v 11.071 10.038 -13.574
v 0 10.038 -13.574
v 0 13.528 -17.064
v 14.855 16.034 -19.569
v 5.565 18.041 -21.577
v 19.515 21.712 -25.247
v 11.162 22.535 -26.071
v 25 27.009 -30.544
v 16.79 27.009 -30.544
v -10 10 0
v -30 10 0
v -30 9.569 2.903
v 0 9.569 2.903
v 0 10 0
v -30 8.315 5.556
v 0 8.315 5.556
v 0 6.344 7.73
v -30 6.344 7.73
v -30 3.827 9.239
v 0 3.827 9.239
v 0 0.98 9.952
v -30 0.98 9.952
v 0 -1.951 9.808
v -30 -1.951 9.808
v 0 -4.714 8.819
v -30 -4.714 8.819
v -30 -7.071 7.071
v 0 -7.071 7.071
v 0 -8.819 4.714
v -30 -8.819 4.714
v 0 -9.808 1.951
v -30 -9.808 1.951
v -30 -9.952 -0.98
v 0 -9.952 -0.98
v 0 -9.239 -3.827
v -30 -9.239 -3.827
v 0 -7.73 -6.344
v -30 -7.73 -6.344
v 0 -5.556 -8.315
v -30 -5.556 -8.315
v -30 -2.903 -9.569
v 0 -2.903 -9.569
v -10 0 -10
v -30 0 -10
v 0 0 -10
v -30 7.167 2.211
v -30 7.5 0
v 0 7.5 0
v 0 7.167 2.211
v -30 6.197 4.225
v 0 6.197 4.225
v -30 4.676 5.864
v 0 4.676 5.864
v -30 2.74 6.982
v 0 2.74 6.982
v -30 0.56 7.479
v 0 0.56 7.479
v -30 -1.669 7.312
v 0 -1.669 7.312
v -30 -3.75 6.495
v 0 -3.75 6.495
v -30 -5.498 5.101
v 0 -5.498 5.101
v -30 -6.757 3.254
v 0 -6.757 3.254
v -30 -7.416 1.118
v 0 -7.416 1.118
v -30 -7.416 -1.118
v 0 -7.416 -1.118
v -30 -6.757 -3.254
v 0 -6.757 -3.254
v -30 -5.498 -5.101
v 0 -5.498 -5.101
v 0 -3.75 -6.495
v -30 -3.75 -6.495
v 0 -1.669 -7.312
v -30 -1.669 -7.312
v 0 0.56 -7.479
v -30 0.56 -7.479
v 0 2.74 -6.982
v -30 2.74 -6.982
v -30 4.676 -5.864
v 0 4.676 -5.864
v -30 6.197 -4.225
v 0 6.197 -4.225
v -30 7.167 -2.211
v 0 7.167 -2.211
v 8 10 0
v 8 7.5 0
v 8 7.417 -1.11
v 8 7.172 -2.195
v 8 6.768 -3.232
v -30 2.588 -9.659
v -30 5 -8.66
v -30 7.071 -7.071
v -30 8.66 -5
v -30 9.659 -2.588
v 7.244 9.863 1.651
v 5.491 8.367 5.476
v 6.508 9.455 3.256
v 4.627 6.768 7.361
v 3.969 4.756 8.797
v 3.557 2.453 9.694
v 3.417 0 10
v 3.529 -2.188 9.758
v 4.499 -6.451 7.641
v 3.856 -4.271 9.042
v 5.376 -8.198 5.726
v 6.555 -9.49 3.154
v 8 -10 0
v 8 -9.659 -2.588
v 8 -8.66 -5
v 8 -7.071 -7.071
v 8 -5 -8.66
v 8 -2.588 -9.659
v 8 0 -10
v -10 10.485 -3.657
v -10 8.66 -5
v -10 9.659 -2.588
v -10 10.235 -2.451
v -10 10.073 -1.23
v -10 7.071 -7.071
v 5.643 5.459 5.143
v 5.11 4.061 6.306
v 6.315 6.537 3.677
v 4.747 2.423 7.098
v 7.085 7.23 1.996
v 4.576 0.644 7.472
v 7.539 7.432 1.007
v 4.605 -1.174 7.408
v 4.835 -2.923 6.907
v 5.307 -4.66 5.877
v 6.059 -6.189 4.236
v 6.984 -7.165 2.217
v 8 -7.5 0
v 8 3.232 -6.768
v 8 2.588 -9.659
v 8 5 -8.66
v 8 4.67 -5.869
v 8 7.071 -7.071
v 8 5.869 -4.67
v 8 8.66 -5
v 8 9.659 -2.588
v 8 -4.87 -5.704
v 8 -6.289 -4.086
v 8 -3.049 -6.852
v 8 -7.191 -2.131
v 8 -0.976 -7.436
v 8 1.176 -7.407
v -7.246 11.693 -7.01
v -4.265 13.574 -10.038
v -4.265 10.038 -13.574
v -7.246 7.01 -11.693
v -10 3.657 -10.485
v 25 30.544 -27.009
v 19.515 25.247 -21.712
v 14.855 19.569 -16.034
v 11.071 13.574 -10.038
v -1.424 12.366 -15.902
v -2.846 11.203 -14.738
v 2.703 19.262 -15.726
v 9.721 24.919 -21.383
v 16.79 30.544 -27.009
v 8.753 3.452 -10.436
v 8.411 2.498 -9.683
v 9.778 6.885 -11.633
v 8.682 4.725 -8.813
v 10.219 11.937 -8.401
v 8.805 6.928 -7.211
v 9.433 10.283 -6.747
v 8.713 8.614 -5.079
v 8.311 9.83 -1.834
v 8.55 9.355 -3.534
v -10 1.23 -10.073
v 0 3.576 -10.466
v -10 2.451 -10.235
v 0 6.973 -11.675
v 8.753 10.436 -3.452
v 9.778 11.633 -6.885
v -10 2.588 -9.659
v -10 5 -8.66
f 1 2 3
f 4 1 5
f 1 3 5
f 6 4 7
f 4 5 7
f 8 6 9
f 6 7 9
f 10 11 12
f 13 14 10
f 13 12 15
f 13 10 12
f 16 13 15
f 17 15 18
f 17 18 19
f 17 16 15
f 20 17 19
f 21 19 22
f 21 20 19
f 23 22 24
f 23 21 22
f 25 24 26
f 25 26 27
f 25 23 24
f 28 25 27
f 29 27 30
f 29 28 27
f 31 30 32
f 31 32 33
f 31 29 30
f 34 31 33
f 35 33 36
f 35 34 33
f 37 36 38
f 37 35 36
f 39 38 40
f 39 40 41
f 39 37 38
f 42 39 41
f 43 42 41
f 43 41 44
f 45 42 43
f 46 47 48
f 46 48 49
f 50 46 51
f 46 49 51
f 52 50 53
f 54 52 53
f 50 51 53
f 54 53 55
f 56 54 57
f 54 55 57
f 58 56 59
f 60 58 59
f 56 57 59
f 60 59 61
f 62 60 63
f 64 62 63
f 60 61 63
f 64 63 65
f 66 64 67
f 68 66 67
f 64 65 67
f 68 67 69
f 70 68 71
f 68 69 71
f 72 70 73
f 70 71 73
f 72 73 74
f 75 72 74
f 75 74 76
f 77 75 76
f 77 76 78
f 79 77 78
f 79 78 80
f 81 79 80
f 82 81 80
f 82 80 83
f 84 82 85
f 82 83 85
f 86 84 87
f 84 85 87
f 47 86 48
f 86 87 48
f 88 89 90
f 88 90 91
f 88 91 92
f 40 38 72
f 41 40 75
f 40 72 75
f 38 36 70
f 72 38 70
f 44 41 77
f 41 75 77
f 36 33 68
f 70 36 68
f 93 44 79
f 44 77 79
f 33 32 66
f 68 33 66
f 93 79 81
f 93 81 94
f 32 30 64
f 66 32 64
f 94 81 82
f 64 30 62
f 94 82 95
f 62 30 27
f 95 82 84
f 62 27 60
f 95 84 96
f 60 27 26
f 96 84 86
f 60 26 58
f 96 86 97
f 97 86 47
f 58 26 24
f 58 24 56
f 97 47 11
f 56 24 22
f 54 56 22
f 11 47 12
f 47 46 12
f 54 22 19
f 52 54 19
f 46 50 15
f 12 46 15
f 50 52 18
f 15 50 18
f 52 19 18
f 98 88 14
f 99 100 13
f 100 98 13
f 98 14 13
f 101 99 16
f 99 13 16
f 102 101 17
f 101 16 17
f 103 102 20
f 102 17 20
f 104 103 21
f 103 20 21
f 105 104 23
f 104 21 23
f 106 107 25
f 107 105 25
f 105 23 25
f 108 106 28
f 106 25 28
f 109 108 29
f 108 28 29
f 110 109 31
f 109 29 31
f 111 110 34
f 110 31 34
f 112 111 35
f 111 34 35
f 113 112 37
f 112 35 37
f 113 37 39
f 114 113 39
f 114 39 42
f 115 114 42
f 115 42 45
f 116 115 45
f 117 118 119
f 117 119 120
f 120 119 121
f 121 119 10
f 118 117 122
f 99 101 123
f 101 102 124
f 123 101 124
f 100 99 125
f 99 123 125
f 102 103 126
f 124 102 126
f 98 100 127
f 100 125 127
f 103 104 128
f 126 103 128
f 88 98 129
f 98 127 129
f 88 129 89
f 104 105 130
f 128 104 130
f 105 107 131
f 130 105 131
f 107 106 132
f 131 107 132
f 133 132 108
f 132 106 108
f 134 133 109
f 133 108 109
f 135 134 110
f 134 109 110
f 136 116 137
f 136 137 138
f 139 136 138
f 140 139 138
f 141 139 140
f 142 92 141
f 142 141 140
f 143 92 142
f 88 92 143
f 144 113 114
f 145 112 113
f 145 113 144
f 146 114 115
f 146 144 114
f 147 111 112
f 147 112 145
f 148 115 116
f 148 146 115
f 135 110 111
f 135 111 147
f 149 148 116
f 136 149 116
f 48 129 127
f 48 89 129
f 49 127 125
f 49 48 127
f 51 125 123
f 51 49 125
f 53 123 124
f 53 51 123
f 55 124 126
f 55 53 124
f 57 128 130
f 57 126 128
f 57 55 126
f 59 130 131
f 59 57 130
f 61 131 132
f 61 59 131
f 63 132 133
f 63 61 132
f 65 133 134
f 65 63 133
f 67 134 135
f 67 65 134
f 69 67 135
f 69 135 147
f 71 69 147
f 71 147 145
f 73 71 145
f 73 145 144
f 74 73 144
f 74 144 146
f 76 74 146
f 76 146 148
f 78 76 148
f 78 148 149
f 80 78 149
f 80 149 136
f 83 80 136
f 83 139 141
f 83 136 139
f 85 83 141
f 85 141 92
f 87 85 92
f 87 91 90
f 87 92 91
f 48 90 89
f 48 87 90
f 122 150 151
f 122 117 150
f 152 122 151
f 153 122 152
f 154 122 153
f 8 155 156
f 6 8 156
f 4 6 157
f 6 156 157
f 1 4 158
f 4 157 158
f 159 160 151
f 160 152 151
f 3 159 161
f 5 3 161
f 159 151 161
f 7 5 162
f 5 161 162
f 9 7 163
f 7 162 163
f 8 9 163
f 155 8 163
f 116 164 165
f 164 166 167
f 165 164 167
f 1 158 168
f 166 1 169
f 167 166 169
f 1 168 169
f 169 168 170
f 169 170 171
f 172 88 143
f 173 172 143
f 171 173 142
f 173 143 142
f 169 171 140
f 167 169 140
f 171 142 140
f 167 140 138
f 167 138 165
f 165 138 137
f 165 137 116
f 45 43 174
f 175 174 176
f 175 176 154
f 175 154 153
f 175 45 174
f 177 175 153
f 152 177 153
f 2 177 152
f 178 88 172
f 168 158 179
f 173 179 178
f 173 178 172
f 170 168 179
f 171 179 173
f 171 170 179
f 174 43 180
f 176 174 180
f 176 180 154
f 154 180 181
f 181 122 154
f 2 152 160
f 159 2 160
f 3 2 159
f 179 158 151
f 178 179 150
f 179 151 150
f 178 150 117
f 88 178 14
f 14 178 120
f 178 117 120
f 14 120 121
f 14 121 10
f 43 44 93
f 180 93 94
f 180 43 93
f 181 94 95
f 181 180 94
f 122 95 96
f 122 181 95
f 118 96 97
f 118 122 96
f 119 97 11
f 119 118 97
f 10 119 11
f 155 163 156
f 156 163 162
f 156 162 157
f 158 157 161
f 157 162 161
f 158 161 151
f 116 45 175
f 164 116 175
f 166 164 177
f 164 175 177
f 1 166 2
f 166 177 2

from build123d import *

# Parameters (mm, degrees)
F0_R          = 7.5
F1_DEPTH      = 8
F2_DEPTH      = 5
F2_DEPTH_BACK = 30
F4_DEPTH      = 12.5
F5_DEPTH      = 10
F5_DEPTH_BACK = 25
F7_DEPTH      = 25
F7_DEPTH_BACK = 25


with BuildPart() as f1:
    # F0 (on Right) → F1 (new body)
    with BuildSketch(Plane.YZ):
        with BuildLine():
            ThreePointArc((0, -10), (7.0710678119, -7.0710678119), (10, 0))
            ThreePointArc((10, 0), (-7.0710678119, 7.0710678119), (0, -10))
        make_face()
        Circle(F0_R, mode=Mode.SUBTRACT)
    extrude(amount=F1_DEPTH)

    # F0 (on Right) → F2 (join, two sides)
    with BuildSketch(Plane.YZ) as f2_sk:
        with BuildLine():
            ThreePointArc((0, -10), (7.0710678119, -7.0710678119), (10, 0))
            ThreePointArc((10, 0), (-7.0710678119, 7.0710678119), (0, -10))
        make_face()
        Circle(F0_R, mode=Mode.SUBTRACT)
    extrude(amount=F2_DEPTH)
    extrude(f2_sk.sketch, amount=-F2_DEPTH_BACK)

    # F3 (on Front) → F4 (cut, symmetric)
    with BuildSketch(Plane.XZ):
        Polygon((8, 0), (8, 10), (3.417424305, 10), align=None)
    extrude(amount=F4_DEPTH, both=True, mode=Mode.SUBTRACT)

    # F0 (on Right) → F5 (join, two sides)
    with BuildSketch(Plane.YZ) as f5_sk:
        with BuildLine():
            ThreePointArc((13.5738675599, -10.038333654), (10.9801111189, -5.3064134392), (10, 0))
            ThreePointArc((10, 0), (7.0710678119, -7.0710678119), (0, -10))
            ThreePointArc((0, -10), (5.3064134392, -10.9801111189), (10.038333654, -13.5738675599))
            Line((10.038333654, -13.5738675599), (27.0088964024, -30.5444303084))
            Line((27.0088964024, -30.5444303084), (30.5444303084, -27.0088964024))
            Line((30.5444303084, -27.0088964024), (13.5738675599, -10.038333654))
        make_face()
    extrude(amount=-F5_DEPTH)
    extrude(f5_sk.sketch, amount=F5_DEPTH_BACK)

    # F6 (on face) → F7 (cut, two sides)
    with BuildSketch(Plane(origin=(0, 1.767766953, 1.767766953), x_dir=(1, 0, 0), z_dir=(0, 0.7071067812, 0.7071067812))) as f7_sk:
        with BuildLine():
            ThreePointArc((-10, 10), (-7.1369616608, 13.3518740219), (-4.2652819266, 16.6963475971))
            Line((-4.2652819266, 16.696347597), (-10, 16.696347597))
            Line((-10, 16.696347597), (-10, 10))
        make_face()
        with BuildLine():
            ThreePointArc((-4.2652819266, 16.6963475971), (6.2060505049, 28.7455446955), (16.7895406485, 40.696347597))
            Line((16.7895406485, 40.696347597), (-10, 40.696347597))
            Line((-10, 40.696347597), (-10, 16.696347597))
            Line((-10, 16.696347597), (-4.2652819266, 16.696347597))
        make_face()
        with BuildLine():
            Line((25, 16.696347597), (25, 40.696347597))
            ThreePointArc((25, 40.696347597), (17.0783625635, 29.2519356675), (11.071357295, 16.696347597))
            Line((11.071357295, 16.696347597), (25, 16.696347597))
        make_face()
        with BuildLine():
            Line((25, 16.696347597), (11.071357295, 16.696347597))
            ThreePointArc((11.071357295, 16.696347597), (9.396655894, 11.9280688615), (8, 7.0710678119))
            Line((8, 7.0710678119), (25, 7.0189046673))
            Line((25, 7.0189046673), (25, 16.696347597))
        make_face()
    extrude(amount=-F7_DEPTH, mode=Mode.SUBTRACT)
    extrude(f7_sk.sketch, amount=F7_DEPTH_BACK, mode=Mode.SUBTRACT)


solid = f1.part
